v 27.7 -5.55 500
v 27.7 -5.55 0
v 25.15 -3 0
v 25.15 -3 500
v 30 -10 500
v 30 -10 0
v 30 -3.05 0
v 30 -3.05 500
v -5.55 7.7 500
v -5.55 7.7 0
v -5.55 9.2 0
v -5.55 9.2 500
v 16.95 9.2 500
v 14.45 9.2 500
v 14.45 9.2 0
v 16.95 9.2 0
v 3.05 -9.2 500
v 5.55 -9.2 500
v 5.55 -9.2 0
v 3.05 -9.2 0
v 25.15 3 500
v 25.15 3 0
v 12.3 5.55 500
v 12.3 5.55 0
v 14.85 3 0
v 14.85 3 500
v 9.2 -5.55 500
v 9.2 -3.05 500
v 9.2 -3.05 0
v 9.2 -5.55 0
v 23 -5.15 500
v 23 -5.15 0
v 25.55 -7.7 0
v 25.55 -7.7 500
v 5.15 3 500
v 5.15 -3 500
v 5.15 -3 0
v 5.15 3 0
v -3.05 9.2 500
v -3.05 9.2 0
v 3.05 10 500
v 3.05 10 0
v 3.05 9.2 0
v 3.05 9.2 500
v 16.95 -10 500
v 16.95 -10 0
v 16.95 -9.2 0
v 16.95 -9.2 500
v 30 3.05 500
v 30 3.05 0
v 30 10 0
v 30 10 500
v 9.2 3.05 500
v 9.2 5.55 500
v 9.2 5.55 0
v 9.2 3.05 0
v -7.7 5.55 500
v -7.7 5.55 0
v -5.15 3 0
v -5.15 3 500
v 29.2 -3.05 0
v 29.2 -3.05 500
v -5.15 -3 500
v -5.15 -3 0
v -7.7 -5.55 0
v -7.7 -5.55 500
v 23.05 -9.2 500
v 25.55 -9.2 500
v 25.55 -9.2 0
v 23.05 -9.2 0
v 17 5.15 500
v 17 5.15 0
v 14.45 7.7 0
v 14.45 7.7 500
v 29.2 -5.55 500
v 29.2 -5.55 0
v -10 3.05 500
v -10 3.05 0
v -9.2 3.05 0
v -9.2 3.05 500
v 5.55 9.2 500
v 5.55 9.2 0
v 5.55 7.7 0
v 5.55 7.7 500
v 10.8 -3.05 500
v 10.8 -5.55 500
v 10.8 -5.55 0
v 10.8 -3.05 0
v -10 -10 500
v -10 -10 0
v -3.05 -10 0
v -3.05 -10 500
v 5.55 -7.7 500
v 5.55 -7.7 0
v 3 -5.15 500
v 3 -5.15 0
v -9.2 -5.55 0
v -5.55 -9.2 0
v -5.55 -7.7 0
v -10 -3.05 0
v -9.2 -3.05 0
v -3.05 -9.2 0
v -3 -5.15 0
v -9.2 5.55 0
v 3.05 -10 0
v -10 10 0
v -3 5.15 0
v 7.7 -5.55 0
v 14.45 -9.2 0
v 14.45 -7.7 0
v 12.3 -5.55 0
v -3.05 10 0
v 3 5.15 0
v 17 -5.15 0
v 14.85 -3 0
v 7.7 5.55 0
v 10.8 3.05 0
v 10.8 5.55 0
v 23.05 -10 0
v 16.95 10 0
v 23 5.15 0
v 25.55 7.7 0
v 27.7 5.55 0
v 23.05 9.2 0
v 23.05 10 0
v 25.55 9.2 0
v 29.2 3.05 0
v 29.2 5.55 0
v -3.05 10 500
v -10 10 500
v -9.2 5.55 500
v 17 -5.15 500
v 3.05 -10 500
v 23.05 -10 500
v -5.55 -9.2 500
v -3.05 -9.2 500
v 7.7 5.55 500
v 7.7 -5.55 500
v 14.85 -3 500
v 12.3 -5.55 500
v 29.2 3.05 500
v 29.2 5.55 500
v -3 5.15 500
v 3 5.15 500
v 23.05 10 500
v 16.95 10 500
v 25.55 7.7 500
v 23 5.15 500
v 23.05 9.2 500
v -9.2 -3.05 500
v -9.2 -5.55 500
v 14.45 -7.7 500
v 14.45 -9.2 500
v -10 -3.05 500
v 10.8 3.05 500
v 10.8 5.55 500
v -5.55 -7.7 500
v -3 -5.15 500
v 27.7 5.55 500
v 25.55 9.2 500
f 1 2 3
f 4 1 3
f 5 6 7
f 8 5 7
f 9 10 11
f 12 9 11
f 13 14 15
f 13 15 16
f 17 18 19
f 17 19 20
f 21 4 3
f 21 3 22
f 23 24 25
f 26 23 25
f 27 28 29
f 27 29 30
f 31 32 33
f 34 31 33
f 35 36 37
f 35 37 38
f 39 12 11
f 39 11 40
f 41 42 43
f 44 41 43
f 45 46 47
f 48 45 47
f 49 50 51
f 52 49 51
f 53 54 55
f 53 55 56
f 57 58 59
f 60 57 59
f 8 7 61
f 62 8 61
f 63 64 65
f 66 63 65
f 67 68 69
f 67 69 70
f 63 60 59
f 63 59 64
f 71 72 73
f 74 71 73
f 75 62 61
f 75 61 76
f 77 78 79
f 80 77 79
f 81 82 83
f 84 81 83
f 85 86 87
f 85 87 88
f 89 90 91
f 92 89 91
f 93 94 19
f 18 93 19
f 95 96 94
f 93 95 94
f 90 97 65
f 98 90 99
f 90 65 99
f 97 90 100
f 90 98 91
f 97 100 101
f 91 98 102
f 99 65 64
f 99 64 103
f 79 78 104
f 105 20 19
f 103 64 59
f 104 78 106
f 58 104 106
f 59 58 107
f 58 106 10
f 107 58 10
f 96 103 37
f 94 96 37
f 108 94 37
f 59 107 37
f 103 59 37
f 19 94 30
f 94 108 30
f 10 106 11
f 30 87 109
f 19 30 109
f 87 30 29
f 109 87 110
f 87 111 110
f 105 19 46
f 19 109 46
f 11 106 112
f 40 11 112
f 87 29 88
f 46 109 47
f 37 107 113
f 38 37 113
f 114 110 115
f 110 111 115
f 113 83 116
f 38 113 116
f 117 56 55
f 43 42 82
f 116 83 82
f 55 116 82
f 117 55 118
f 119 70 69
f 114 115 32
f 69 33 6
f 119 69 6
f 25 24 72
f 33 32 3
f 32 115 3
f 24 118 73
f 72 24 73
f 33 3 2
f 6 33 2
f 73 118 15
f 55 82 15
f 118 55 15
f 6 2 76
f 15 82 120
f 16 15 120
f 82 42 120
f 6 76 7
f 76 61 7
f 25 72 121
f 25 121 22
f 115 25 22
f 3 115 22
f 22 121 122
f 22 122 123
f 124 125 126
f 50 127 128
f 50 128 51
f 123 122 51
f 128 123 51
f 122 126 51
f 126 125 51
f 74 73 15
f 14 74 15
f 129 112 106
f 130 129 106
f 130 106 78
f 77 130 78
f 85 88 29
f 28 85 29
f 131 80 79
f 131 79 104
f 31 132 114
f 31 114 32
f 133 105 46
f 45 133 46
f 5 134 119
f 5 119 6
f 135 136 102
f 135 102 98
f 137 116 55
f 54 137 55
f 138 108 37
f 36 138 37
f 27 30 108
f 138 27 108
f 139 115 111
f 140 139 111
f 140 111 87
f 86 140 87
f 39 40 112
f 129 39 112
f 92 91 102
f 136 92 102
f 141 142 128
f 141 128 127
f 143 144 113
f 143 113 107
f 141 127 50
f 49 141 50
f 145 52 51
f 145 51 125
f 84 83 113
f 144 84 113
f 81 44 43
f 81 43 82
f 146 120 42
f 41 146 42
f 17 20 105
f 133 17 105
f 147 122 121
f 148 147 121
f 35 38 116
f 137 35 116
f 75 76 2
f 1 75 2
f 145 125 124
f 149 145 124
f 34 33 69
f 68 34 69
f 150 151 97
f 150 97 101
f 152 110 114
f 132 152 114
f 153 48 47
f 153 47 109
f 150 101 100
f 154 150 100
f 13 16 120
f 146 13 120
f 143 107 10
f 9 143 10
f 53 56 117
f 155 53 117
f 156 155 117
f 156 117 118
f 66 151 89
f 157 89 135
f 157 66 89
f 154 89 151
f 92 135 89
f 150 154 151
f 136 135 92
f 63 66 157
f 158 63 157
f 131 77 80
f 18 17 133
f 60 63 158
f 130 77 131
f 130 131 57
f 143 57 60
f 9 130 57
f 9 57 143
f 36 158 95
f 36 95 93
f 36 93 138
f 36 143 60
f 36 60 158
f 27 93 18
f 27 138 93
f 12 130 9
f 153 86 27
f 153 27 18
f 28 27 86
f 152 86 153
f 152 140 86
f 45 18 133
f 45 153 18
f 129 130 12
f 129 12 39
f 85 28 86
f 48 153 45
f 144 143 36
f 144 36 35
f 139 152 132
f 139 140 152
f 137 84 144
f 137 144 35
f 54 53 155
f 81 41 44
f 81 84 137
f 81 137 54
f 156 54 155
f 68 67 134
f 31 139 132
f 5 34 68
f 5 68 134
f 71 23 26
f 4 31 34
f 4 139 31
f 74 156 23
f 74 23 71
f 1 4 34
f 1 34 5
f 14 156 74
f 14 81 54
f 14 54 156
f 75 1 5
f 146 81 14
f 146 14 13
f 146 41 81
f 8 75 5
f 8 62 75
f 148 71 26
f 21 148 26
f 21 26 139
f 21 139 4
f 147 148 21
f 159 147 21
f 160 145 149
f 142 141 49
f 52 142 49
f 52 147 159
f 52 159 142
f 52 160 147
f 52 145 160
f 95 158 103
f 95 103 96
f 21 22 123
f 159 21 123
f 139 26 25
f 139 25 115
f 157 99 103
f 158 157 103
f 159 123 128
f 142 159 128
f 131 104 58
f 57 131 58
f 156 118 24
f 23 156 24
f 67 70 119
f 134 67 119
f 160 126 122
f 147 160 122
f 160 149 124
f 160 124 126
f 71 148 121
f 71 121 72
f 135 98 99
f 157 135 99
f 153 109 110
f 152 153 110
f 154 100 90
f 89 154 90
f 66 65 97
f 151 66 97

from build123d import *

# Parameters (mm, degrees)
EXTRUDE_1_DEPTH = 500


with BuildPart() as part:
    # 草图1 → 凸台-拉伸1 (new body)
    with BuildSketch(Plane.XY):
        Polygon((-10, -3.05), (-10, -10), (-3.05, -10), (-3.05, -9.2), (-5.55, -9.2), (-5.55, -7.7), (-3, -5.15), (3, -5.15), (5.55, -7.7), (5.55, -9.2), (3.05, -9.2), (3.05, -10), (16.95, -10), (16.95, -9.2), (14.45, -9.2), (14.45, -7.7), (17, -5.15), (23, -5.15), (25.55, -7.7), (25.55, -9.2), (23.05, -9.2), (23.05, -10), (30, -10), (30, -3.05), (29.2, -3.05), (29.2, -5.55), (27.7, -5.55), (25.15, -3), (25.15, 3), (27.7, 5.55), (29.2, 5.55), (29.2, 3.05), (30, 3.05), (30, 10), (23.05, 10), (23.05, 9.2), (25.55, 9.2), (25.55, 7.7), (23, 5.15), (17, 5.15), (14.45, 7.7), (14.45, 9.2), (16.95, 9.2), (16.95, 10), (3.05, 10), (3.05, 9.2), (5.55, 9.2), (5.55, 7.7), (3, 5.15), (-3, 5.15), (-5.55, 7.7), (-5.55, 9.2), (-3.05, 9.2), (-3.05, 10), (-10, 10), (-10, 3.05), (-9.2, 3.05), (-9.2, 5.55), (-7.7, 5.55), (-5.15, 3), (-5.15, -3), (-7.7, -5.55), (-9.2, -5.55), (-9.2, -3.05), align=None)
        Polygon((9.2, 3.05), (10, 3.05), (10.8, 3.05), (10.8, 5.55), (12.3, 5.55), (14.85, 3), (14.85, -3), (12.3, -5.55), (10.8, -5.55), (10.8, -3.05), (10, -3.05), (9.2, -3.05), (9.2, -5.55), (7.7, -5.55), (5.15, -3), (5.15, 3), (7.7, 5.55), (9.2, 5.55), align=None, mode=Mode.SUBTRACT)
    extrude(amount=EXTRUDE_1_DEPTH)


solid = part.part
